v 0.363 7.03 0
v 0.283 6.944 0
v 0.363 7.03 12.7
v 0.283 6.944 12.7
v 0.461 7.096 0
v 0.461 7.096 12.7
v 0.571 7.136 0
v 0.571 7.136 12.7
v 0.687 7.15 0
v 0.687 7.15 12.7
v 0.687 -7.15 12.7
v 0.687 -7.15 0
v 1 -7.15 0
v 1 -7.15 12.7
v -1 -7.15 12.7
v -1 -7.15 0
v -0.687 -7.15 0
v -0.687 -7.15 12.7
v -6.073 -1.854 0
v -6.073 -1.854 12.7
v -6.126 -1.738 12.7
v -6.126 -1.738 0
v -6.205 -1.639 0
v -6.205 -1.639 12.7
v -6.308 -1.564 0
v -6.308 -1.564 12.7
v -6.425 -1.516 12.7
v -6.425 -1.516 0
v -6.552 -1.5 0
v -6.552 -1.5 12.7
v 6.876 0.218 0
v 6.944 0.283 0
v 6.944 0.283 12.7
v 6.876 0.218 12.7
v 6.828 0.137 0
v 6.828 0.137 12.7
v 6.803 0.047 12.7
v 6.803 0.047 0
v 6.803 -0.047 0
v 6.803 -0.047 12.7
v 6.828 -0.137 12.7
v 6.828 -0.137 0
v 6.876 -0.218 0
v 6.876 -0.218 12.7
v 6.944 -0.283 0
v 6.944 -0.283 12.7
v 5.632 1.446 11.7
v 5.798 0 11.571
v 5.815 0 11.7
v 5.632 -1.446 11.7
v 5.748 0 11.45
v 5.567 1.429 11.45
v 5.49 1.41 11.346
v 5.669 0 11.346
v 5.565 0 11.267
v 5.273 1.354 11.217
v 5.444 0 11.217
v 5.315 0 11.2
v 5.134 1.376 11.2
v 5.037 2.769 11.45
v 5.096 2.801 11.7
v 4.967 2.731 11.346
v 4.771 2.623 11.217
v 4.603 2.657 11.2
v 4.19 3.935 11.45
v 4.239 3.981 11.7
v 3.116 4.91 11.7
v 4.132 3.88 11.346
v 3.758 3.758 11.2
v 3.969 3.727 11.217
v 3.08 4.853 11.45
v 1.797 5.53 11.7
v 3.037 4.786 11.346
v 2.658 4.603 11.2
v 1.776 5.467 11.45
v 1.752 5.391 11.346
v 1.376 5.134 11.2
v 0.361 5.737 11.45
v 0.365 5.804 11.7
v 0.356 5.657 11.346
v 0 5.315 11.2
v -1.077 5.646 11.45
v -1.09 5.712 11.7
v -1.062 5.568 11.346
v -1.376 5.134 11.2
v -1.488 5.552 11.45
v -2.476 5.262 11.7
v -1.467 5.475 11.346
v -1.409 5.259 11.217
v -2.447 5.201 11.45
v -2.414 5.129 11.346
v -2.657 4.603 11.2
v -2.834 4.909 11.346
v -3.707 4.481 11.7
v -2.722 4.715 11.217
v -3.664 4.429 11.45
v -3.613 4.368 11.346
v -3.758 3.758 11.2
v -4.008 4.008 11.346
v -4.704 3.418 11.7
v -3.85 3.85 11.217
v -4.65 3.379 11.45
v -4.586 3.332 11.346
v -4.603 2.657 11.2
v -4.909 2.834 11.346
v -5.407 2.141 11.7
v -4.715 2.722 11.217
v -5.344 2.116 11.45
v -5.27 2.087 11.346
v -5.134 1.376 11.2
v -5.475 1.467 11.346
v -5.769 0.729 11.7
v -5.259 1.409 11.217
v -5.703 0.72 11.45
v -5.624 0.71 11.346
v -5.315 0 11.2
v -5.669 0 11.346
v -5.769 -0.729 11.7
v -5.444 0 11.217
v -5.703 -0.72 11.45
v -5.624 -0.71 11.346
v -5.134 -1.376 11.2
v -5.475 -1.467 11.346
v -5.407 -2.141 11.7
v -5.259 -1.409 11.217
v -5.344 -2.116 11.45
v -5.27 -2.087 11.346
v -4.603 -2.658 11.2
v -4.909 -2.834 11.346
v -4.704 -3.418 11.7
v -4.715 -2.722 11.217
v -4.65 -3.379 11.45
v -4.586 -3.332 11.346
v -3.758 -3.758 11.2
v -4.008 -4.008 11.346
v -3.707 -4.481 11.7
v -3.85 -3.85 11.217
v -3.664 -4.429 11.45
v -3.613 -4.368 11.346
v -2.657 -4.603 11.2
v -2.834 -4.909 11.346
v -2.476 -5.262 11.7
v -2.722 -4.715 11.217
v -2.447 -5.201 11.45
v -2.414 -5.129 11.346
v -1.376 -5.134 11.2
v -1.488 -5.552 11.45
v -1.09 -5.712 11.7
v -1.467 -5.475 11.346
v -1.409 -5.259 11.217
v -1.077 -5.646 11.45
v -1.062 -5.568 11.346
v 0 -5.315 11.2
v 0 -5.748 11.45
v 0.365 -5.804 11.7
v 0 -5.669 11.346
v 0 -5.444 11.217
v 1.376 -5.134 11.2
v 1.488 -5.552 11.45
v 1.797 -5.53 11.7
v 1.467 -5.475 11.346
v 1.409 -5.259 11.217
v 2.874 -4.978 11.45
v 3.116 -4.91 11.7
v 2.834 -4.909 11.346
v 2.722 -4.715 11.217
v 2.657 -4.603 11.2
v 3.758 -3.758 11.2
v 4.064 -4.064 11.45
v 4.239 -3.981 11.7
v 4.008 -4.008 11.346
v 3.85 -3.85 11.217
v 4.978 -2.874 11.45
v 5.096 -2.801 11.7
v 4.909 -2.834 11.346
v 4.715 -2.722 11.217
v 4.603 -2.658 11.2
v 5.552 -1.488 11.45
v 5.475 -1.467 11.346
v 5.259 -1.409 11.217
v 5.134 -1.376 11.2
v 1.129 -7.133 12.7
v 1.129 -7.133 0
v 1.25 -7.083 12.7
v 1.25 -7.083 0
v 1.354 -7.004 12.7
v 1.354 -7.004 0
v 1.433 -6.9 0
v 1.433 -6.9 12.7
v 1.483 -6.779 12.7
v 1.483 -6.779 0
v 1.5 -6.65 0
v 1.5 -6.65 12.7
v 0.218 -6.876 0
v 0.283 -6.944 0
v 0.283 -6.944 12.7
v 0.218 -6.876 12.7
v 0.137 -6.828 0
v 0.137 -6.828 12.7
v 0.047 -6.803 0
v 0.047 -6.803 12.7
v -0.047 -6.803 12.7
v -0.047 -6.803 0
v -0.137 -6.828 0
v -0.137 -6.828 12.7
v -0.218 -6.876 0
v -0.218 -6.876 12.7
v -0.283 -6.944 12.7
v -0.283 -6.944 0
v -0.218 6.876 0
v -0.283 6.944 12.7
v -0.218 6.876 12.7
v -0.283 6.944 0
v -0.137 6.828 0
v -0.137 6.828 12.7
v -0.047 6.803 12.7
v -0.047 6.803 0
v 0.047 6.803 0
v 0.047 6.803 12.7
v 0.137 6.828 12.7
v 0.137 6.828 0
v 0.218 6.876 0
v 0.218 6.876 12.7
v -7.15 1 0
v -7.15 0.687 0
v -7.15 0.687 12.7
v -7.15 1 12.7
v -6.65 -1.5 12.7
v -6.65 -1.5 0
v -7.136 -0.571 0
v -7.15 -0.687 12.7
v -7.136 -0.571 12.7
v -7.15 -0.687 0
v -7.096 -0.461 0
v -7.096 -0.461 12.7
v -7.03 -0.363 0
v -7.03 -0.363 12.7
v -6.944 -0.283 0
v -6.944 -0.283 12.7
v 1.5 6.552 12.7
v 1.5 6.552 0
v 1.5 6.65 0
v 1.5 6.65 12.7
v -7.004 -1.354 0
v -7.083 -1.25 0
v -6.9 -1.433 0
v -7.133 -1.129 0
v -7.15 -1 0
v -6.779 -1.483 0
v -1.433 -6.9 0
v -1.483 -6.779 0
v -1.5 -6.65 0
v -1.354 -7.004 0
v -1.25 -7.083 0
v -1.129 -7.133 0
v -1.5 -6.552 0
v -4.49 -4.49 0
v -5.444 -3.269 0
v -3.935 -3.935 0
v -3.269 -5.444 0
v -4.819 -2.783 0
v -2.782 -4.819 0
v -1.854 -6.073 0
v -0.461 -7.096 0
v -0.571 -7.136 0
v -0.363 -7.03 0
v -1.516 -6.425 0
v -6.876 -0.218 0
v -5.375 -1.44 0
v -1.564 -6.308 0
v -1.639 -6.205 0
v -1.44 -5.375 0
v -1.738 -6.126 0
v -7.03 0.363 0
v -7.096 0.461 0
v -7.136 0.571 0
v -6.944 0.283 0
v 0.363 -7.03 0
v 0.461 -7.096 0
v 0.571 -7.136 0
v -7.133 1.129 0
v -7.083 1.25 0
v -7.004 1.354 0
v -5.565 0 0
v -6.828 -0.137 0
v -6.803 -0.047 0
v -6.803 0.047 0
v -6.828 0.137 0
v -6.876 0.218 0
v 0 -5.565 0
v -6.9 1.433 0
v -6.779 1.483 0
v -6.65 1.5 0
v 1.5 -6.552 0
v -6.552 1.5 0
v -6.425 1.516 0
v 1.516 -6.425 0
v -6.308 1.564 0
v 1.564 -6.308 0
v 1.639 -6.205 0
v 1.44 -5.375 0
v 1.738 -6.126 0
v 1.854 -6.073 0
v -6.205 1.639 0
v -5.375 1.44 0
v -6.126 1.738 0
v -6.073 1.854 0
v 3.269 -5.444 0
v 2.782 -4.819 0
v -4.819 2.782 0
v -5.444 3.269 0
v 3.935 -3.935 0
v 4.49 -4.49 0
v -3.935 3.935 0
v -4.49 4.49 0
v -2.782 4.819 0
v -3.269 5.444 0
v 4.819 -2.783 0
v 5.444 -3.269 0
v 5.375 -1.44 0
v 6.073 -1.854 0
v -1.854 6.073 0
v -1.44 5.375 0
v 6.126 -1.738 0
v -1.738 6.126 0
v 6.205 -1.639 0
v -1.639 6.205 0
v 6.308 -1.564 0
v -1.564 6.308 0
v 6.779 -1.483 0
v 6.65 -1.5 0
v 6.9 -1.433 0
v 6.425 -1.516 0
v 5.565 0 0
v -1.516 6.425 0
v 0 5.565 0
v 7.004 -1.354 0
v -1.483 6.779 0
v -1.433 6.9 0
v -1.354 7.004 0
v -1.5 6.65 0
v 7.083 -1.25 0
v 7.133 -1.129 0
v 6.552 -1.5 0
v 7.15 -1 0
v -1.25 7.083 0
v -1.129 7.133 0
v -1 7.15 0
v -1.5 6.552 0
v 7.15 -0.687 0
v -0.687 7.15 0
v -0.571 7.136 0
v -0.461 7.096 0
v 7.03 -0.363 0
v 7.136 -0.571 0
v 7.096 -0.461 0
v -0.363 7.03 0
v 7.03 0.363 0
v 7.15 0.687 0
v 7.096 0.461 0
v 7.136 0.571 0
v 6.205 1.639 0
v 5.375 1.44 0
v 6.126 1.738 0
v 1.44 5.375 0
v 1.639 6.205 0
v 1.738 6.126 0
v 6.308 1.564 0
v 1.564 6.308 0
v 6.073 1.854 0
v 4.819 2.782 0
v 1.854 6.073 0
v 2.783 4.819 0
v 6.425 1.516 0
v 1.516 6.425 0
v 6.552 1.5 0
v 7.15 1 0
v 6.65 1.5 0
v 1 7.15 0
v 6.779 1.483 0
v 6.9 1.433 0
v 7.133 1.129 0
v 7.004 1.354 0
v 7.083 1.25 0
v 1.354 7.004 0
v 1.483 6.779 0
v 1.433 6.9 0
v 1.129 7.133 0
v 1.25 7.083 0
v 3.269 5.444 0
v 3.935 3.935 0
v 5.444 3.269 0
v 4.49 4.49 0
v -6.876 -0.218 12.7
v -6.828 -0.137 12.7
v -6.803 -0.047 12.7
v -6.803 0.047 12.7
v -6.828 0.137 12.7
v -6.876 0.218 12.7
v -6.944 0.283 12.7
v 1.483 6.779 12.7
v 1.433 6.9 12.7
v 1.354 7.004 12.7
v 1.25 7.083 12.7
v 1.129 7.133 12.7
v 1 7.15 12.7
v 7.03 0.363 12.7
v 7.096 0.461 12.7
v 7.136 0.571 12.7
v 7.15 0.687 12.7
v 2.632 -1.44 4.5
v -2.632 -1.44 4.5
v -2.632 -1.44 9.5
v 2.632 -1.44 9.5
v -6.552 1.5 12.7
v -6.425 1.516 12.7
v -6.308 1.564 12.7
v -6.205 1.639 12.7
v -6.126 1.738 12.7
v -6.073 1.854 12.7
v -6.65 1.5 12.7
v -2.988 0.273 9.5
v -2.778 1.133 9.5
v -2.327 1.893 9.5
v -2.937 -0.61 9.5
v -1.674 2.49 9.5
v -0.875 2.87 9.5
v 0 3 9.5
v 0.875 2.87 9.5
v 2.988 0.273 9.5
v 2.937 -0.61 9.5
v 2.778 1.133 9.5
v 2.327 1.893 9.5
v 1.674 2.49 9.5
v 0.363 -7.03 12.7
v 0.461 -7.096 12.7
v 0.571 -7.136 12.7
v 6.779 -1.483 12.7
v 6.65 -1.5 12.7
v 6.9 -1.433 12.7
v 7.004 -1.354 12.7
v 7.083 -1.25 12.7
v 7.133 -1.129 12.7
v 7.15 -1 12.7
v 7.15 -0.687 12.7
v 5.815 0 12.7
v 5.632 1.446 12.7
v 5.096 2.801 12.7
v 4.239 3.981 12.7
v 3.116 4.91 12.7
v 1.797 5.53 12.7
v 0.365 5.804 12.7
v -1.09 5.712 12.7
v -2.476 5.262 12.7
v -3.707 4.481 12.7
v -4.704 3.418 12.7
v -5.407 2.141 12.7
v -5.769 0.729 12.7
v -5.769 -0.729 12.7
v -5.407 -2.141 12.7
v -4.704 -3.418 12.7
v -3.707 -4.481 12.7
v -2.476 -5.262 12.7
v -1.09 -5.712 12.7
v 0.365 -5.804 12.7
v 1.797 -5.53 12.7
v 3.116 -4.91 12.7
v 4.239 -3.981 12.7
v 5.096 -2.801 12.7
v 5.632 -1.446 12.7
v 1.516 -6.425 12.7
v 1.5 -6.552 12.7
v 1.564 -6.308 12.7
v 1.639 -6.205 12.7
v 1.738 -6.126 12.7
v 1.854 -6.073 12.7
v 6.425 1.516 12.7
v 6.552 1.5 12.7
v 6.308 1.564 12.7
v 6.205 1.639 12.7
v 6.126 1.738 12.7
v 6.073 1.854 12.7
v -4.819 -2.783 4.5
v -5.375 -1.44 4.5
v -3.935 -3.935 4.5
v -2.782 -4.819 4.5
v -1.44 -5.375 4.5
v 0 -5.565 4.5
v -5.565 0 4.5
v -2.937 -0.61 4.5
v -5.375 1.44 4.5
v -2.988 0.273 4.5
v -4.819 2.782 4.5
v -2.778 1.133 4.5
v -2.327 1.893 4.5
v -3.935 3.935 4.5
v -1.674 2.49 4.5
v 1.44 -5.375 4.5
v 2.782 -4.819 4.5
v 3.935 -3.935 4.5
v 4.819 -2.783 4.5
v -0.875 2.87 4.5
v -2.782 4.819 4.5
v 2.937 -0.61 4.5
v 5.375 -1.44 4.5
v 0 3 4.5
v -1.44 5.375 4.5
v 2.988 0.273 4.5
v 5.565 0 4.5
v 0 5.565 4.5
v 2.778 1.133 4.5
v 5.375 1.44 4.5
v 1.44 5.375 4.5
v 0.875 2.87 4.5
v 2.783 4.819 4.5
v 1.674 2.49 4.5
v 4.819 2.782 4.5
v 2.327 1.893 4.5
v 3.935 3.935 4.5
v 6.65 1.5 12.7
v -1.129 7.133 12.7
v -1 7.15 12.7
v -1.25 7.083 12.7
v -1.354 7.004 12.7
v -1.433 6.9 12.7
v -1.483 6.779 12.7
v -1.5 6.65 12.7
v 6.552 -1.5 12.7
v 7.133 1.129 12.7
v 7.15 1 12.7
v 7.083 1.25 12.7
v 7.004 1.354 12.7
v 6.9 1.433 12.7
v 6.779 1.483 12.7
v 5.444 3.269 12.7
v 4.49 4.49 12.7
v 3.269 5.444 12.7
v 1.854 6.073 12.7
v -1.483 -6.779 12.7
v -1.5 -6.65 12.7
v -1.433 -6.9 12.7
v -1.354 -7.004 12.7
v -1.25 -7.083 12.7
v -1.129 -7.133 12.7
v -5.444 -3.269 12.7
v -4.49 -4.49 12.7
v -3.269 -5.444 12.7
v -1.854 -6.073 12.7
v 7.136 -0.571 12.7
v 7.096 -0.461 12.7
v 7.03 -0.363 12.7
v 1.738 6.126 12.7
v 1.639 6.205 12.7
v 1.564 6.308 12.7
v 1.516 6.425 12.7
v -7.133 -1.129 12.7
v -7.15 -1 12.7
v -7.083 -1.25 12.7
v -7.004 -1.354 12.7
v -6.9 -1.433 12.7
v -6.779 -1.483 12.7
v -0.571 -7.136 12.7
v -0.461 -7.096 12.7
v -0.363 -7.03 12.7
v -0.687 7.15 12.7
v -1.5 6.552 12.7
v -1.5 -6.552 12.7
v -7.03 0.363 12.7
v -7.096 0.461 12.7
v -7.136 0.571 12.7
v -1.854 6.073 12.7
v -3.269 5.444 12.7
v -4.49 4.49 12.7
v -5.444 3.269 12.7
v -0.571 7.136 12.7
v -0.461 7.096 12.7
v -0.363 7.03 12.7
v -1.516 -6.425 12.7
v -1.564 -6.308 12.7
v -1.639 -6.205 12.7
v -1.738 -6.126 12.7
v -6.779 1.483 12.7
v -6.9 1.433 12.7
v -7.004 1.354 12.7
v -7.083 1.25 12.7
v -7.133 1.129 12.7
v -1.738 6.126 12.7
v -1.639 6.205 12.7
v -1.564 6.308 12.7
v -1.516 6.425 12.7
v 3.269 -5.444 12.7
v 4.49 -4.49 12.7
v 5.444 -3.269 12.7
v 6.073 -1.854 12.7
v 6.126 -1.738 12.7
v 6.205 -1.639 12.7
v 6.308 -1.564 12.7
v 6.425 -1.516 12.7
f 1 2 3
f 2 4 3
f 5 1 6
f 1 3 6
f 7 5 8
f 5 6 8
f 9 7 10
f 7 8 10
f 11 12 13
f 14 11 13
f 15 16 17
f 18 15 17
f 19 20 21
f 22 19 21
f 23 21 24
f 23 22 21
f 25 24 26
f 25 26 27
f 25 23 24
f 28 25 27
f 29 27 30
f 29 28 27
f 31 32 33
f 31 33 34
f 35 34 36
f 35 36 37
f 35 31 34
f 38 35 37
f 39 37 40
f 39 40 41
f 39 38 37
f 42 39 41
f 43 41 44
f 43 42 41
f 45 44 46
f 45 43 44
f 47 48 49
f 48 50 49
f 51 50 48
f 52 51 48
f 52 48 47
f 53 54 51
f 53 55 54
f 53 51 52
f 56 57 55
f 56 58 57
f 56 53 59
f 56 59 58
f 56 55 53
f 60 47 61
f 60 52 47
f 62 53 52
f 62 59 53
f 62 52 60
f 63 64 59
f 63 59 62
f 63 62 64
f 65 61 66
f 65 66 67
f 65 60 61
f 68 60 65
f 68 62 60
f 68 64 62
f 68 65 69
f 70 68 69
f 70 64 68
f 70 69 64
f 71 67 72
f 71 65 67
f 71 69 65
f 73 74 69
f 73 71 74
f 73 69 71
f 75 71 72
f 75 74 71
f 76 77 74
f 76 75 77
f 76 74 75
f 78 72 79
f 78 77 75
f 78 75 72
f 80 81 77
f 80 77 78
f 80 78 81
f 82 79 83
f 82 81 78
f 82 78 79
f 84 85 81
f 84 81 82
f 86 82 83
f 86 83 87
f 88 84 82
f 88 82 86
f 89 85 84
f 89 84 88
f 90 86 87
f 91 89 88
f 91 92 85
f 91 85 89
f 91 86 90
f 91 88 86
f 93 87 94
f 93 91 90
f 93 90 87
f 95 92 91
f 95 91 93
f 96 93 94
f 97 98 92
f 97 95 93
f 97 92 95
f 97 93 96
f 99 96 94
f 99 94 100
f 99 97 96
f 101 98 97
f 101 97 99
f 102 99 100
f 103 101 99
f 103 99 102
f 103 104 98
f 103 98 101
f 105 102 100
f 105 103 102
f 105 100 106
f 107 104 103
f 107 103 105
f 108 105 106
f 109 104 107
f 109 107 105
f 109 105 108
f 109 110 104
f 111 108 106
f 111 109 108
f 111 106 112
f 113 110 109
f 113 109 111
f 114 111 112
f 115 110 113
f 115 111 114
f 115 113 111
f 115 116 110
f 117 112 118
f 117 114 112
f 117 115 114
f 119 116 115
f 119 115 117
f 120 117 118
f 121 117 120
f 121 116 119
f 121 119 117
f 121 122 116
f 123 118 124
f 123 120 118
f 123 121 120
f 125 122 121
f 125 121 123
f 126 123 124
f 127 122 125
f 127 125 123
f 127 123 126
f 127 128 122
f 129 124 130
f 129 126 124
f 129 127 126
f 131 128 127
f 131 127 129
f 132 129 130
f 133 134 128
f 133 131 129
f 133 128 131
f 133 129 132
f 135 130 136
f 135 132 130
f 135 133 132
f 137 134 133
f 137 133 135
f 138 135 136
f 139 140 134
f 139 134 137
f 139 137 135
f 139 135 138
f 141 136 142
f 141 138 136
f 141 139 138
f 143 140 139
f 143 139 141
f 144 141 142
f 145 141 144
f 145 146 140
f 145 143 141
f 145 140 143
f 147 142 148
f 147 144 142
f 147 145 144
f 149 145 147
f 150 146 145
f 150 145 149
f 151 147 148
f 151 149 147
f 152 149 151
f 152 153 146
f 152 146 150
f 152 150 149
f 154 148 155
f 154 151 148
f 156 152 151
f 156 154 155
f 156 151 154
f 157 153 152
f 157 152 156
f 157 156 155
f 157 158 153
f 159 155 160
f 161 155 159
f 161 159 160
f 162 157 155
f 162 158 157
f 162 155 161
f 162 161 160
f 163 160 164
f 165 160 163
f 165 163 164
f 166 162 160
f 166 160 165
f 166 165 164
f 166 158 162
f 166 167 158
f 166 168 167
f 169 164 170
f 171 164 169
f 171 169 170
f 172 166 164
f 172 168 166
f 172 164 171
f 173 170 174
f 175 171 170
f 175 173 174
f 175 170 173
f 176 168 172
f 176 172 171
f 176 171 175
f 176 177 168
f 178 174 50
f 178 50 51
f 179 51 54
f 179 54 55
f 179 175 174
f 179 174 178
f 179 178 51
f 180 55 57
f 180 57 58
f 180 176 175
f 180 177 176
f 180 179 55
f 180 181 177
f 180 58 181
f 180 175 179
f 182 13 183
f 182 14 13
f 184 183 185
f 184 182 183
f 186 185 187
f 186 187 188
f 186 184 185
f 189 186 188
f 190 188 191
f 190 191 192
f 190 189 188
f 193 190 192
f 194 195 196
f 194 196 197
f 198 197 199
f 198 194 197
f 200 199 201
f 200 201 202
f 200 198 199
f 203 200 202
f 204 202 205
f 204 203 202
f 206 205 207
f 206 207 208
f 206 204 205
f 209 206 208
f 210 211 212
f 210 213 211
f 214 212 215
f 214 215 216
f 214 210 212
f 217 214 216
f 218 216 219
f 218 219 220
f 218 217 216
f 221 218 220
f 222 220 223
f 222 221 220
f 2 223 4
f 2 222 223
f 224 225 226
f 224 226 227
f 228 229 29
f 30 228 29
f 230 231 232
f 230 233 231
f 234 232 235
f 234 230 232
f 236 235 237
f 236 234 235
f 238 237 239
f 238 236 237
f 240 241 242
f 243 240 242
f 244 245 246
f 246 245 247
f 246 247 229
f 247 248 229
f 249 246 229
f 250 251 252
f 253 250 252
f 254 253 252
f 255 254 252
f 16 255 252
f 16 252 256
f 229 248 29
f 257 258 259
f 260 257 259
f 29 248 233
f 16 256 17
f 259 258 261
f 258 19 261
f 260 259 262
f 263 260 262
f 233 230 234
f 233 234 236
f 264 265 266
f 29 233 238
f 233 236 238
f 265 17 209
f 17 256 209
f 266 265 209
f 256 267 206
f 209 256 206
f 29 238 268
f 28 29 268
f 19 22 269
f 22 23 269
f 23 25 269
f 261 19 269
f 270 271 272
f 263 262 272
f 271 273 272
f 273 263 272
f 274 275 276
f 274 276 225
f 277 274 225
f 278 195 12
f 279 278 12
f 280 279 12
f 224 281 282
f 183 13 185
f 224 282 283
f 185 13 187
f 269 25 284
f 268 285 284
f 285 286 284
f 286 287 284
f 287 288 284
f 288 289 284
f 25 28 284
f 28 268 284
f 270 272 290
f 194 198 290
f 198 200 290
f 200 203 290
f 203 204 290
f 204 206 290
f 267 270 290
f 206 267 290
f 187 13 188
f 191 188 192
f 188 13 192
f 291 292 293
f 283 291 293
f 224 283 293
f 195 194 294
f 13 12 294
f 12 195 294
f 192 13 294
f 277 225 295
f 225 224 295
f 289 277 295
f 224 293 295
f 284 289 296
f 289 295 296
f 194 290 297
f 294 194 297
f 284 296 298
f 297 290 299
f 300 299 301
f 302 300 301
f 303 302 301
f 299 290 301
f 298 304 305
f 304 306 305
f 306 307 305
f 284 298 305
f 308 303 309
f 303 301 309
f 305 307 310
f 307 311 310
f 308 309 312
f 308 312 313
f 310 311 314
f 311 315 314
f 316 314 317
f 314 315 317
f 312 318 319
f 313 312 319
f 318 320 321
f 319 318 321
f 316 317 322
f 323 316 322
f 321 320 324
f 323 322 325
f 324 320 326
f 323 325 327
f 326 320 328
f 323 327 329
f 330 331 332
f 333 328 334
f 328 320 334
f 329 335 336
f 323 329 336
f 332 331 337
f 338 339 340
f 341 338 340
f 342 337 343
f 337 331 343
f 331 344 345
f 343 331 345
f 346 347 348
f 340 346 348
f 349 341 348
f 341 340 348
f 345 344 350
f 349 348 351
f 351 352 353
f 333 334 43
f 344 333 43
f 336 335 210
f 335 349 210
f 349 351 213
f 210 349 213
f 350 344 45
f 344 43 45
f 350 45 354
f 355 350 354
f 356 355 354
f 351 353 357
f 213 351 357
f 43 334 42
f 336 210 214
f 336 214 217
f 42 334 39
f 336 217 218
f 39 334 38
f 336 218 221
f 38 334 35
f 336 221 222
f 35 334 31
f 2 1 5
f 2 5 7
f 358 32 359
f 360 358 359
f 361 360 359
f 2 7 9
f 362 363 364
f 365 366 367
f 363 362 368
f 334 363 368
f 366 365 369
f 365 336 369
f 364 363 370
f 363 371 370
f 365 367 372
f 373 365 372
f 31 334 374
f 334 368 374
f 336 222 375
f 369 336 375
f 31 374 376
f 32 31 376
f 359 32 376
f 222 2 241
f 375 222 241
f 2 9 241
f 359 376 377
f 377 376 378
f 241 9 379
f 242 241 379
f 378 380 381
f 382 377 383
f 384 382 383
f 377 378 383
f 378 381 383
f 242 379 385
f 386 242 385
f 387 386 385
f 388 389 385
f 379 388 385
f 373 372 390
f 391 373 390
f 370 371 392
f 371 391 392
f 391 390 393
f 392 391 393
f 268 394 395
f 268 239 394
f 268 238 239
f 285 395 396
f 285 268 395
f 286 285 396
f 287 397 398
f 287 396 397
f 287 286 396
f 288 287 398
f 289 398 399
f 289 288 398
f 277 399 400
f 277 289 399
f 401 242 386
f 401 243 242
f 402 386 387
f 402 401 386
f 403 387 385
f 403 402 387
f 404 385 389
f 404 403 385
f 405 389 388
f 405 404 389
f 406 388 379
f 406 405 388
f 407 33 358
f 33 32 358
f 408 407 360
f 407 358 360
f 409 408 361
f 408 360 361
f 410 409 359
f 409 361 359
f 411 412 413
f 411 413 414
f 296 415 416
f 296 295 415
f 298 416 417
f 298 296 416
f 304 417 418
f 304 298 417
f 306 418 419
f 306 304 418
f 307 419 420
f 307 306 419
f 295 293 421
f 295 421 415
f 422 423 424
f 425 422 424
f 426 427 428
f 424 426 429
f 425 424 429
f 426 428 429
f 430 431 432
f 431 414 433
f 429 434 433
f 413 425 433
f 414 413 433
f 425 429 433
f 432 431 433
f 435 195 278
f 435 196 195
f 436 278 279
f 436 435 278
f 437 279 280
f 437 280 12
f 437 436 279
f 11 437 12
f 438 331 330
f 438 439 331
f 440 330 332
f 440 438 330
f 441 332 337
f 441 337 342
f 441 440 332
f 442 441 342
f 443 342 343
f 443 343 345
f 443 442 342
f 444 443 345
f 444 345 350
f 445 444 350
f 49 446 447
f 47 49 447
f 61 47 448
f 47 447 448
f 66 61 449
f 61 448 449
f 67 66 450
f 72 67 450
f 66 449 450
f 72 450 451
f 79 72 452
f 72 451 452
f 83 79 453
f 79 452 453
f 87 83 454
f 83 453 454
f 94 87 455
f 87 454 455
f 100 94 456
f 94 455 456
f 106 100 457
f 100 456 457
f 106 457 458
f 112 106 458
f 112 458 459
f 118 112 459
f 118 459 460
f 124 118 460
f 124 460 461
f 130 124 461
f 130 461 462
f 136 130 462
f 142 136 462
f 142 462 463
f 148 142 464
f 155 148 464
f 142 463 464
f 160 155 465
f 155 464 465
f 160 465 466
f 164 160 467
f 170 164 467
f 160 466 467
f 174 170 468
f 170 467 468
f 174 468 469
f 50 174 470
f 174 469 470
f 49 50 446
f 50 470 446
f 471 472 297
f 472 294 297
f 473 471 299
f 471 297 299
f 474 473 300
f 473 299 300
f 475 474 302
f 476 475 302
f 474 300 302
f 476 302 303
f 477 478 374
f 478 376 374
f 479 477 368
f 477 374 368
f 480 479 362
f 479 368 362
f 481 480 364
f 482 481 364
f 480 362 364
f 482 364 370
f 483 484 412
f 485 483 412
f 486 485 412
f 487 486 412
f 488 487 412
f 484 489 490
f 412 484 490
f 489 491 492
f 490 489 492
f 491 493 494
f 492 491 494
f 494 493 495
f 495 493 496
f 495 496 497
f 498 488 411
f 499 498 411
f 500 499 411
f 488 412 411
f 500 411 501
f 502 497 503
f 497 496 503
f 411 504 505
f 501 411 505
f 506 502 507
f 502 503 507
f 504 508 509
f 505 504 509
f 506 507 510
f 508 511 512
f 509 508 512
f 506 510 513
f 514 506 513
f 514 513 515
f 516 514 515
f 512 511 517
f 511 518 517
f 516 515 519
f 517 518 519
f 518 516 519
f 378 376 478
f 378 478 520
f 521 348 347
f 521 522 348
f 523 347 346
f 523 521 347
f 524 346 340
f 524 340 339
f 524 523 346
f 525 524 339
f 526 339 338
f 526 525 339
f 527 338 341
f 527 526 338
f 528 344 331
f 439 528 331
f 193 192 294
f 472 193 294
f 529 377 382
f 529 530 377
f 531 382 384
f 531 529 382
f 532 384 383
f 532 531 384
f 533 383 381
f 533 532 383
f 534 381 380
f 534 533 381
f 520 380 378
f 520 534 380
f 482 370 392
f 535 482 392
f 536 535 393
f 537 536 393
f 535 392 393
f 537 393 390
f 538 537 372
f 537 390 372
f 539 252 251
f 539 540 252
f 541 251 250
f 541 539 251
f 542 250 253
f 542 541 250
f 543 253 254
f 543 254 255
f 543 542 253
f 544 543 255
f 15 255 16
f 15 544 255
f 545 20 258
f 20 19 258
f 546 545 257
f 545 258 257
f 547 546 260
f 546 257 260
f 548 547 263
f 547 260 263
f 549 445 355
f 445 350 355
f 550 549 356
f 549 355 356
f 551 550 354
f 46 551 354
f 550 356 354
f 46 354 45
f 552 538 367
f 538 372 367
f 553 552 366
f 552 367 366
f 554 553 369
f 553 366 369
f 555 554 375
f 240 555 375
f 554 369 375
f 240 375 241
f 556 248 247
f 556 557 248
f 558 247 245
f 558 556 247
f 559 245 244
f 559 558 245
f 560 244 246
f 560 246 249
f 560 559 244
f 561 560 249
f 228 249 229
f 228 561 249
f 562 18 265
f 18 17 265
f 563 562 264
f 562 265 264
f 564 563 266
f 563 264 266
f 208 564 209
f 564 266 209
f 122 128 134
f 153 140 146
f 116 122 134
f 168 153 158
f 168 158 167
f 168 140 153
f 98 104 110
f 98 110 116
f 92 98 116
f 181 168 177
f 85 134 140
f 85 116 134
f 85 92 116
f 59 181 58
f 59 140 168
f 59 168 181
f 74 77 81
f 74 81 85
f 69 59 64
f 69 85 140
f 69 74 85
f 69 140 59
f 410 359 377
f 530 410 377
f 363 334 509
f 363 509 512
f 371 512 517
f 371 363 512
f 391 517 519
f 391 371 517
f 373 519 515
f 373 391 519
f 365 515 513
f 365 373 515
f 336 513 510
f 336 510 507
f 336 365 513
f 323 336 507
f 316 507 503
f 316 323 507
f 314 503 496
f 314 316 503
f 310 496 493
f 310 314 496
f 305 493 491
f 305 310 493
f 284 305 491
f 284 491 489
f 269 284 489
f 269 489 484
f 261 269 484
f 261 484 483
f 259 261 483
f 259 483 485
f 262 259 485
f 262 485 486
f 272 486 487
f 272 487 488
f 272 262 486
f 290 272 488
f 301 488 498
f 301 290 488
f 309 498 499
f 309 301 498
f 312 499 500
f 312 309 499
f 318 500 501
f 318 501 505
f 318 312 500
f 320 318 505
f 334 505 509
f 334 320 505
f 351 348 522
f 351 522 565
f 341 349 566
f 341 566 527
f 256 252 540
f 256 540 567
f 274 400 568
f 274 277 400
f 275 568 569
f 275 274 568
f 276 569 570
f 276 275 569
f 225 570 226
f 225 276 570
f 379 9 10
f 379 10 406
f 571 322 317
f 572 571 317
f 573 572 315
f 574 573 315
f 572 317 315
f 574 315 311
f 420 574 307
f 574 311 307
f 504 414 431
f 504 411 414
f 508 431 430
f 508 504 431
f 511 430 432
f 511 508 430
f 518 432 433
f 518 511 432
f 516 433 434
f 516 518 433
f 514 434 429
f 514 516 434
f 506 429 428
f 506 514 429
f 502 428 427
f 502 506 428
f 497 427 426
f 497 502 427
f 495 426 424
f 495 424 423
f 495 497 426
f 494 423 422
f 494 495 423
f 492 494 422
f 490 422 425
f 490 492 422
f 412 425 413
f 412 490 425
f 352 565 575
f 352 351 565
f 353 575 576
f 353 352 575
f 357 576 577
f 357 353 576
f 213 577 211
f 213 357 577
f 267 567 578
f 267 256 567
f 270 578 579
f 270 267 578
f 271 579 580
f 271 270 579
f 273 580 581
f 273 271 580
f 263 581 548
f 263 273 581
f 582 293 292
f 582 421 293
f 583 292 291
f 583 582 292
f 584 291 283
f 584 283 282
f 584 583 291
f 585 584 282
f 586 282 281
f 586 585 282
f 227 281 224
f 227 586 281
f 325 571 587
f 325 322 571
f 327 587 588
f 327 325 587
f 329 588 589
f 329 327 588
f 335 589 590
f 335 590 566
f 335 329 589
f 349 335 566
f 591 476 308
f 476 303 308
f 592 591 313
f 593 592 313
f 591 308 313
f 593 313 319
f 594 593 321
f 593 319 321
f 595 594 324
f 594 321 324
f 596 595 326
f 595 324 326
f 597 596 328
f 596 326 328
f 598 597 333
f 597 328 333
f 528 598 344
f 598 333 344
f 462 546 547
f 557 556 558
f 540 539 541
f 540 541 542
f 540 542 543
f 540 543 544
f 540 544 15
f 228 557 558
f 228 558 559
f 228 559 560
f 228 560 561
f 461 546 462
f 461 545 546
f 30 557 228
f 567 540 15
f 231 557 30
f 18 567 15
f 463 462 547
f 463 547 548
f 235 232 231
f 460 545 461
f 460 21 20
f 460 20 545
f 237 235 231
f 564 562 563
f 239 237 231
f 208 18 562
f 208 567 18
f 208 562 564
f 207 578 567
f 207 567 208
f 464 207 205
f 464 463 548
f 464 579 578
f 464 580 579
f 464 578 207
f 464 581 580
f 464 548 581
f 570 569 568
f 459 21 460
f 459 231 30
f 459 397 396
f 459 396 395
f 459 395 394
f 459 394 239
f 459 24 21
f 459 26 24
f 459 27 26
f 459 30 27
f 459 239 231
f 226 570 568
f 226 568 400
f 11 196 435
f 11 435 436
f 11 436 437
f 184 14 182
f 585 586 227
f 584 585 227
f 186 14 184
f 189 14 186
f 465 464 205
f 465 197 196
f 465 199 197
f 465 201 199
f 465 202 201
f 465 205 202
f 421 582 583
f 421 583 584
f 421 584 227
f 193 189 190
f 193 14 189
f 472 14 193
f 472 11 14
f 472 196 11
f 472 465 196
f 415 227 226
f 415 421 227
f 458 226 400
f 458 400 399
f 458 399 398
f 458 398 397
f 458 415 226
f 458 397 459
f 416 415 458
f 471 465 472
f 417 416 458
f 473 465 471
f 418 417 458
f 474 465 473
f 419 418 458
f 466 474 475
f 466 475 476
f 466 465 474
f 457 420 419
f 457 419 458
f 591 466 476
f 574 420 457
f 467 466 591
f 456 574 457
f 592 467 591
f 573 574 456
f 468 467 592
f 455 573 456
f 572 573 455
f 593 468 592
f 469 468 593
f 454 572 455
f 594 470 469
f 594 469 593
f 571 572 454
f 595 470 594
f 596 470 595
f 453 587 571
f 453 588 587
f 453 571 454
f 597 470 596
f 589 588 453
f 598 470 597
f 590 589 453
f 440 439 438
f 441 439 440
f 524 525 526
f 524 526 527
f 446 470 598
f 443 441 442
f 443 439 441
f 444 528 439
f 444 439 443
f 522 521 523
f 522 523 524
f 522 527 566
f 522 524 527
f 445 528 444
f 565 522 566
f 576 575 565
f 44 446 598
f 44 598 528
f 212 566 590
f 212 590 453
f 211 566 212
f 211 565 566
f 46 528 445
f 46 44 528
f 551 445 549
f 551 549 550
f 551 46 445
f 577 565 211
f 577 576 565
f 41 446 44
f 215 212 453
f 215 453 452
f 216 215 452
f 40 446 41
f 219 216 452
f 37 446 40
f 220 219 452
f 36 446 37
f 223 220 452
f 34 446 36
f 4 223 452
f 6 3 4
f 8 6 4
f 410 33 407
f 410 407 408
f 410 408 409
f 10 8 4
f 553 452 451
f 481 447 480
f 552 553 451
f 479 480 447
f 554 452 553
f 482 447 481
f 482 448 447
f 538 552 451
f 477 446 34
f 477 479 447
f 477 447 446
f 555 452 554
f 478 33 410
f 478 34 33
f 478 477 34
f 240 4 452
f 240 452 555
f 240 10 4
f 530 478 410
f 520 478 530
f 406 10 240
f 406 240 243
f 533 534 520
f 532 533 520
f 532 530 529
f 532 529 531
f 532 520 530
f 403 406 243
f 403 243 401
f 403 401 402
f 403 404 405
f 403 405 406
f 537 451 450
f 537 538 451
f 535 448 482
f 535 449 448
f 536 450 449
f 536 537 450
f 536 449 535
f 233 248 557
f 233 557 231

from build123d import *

# Parameters (mm, degrees)
SKETCH1_R           = 6.35
BOSS_EXTRUDE1_DEPTH = 12.7
SKETCH2_W           = 14.3
SKETCH2_H           = 3
BOSS_EXTRUDE2_DEPTH = 12.7
SKETCH3_W           = 3
SKETCH3_H           = 14.3
BOSS_EXTRUDE3_DEPTH = 12.7
SKETCH4_R           = 0.35
CUT_EXTRUDE2_DEPTH  = 12.7
FILLET1_R           = 0.5
FILLET2_R           = 0.5
CUT_EXTRUDE3_START  = 12.7
SKETCH5_R           = 5.815
CUT_EXTRUDE3_DEPTH  = 1.5
FILLET3_R           = 0.5
SKETCH7_R           = 3
CUT_EXTRUDE5_DEPTH  = 9.5
BOSS_EXTRUDE4_START = 1
SKETCH8_W           = 6
SKETCH8_H           = 1.56
BOSS_EXTRUDE4_DEPTH = 9.5
SKETCH6_R           = 5.565
CUT_EXTRUDE4_DEPTH  = 4.5


with BuildPart() as part:
    # Sketch1 → Boss-Extrude1 (new body)
    with BuildSketch(Plane.XY):
        Circle(SKETCH1_R)
    extrude(amount=BOSS_EXTRUDE1_DEPTH)

    # Sketch2 → Boss-Extrude2 (add)
    with BuildSketch(Plane.XY):
        Rectangle(SKETCH2_W, SKETCH2_H)
    extrude(amount=BOSS_EXTRUDE2_DEPTH)

    # Sketch3 → Boss-Extrude3 (add)
    with BuildSketch(Plane.XY):
        Rectangle(SKETCH3_W, SKETCH3_H)
    extrude(amount=BOSS_EXTRUDE3_DEPTH)

    # Sketch4 → Cut-Extrude2 (cut)
    with BuildSketch(Plane.XY):
        with Locations((0, 7.15)):
            Circle(SKETCH4_R)
        with Locations((7.15, 0)):
            Circle(SKETCH4_R)
        with Locations((-7.15, 0)):
            Circle(SKETCH4_R)
        with Locations((0, -7.15)):
            Circle(SKETCH4_R)
    extrude(amount=CUT_EXTRUDE2_DEPTH, mode=Mode.SUBTRACT)

    # Fillet1
    fillet1_edges = [part.edges().sort_by_distance(p)[0] for p in [
        (7.15, 1.5, 6.35),
        (-7.15, -1.5, 6.35),
        (7.15, -1.5, 6.35),
        (-7.15, 1.5, 6.35),
        (1.5, -7.15, 6.35),
        (-1.5, 7.15, 6.35),
        (1.5, 7.15, 6.35),
        (-1.5, -7.15, 6.35),
    ]]
    fillet(fillet1_edges, radius=FILLET1_R)

    # Fillet2
    fillet2_edges = [part.edges().sort_by_distance(p)[0] for p in [
        (-6.170291727, 1.5, 6.35),
        (6.170291727, 1.5, 6.35),
        (6.170291727, -1.5, 6.35),
        (-6.170291727, -1.5, 6.35),
        (1.5, 6.170291727, 6.35),
        (1.5, -6.170291727, 6.35),
        (-1.5, 6.170291727, 6.35),
        (-1.5, -6.170291727, 6.35),
        (0.35, 7.15, 6.35),
        (-0.35, 7.15, 6.35),
        (-0.35, -7.15, 6.35),
        (0.35, -7.15, 6.35),
        (7.15, -0.35, 6.35),
        (7.15, 0.35, 6.35),
        (-7.15, 0.35, 6.35),
        (-7.15, -0.35, 6.35),
    ]]
    fillet(fillet2_edges, radius=FILLET2_R)

    # Sketch5 → Cut-Extrude3 (cut)
    with BuildSketch(Plane.XY.offset(CUT_EXTRUDE3_START)):
        Circle(SKETCH5_R)
    extrude(amount=-CUT_EXTRUDE3_DEPTH, mode=Mode.SUBTRACT)

    # Fillet3
    fillet3_edges = [part.edges().sort_by_distance(p)[0] for p in [
        (-5.815, 0, 11.2),
    ]]
    fillet(fillet3_edges, radius=FILLET3_R)

    # Sketch7 → Cut-Extrude5 (cut)
    with BuildSketch(Plane.XY):
        Circle(SKETCH7_R)
    extrude(amount=CUT_EXTRUDE5_DEPTH, mode=Mode.SUBTRACT)

    # Sketch8 → Boss-Extrude4 (add)
    with BuildSketch(Plane.XY.offset(BOSS_EXTRUDE4_START)):
        with Locations((0, -2.22)):
            Rectangle(SKETCH8_W, SKETCH8_H)
    extrude(amount=BOSS_EXTRUDE4_DEPTH)

    # Sketch6 → Cut-Extrude4 (cut)
    with BuildSketch(Plane.XY):
        Circle(SKETCH6_R)
    extrude(amount=CUT_EXTRUDE4_DEPTH, mode=Mode.SUBTRACT)


solid = part.part
